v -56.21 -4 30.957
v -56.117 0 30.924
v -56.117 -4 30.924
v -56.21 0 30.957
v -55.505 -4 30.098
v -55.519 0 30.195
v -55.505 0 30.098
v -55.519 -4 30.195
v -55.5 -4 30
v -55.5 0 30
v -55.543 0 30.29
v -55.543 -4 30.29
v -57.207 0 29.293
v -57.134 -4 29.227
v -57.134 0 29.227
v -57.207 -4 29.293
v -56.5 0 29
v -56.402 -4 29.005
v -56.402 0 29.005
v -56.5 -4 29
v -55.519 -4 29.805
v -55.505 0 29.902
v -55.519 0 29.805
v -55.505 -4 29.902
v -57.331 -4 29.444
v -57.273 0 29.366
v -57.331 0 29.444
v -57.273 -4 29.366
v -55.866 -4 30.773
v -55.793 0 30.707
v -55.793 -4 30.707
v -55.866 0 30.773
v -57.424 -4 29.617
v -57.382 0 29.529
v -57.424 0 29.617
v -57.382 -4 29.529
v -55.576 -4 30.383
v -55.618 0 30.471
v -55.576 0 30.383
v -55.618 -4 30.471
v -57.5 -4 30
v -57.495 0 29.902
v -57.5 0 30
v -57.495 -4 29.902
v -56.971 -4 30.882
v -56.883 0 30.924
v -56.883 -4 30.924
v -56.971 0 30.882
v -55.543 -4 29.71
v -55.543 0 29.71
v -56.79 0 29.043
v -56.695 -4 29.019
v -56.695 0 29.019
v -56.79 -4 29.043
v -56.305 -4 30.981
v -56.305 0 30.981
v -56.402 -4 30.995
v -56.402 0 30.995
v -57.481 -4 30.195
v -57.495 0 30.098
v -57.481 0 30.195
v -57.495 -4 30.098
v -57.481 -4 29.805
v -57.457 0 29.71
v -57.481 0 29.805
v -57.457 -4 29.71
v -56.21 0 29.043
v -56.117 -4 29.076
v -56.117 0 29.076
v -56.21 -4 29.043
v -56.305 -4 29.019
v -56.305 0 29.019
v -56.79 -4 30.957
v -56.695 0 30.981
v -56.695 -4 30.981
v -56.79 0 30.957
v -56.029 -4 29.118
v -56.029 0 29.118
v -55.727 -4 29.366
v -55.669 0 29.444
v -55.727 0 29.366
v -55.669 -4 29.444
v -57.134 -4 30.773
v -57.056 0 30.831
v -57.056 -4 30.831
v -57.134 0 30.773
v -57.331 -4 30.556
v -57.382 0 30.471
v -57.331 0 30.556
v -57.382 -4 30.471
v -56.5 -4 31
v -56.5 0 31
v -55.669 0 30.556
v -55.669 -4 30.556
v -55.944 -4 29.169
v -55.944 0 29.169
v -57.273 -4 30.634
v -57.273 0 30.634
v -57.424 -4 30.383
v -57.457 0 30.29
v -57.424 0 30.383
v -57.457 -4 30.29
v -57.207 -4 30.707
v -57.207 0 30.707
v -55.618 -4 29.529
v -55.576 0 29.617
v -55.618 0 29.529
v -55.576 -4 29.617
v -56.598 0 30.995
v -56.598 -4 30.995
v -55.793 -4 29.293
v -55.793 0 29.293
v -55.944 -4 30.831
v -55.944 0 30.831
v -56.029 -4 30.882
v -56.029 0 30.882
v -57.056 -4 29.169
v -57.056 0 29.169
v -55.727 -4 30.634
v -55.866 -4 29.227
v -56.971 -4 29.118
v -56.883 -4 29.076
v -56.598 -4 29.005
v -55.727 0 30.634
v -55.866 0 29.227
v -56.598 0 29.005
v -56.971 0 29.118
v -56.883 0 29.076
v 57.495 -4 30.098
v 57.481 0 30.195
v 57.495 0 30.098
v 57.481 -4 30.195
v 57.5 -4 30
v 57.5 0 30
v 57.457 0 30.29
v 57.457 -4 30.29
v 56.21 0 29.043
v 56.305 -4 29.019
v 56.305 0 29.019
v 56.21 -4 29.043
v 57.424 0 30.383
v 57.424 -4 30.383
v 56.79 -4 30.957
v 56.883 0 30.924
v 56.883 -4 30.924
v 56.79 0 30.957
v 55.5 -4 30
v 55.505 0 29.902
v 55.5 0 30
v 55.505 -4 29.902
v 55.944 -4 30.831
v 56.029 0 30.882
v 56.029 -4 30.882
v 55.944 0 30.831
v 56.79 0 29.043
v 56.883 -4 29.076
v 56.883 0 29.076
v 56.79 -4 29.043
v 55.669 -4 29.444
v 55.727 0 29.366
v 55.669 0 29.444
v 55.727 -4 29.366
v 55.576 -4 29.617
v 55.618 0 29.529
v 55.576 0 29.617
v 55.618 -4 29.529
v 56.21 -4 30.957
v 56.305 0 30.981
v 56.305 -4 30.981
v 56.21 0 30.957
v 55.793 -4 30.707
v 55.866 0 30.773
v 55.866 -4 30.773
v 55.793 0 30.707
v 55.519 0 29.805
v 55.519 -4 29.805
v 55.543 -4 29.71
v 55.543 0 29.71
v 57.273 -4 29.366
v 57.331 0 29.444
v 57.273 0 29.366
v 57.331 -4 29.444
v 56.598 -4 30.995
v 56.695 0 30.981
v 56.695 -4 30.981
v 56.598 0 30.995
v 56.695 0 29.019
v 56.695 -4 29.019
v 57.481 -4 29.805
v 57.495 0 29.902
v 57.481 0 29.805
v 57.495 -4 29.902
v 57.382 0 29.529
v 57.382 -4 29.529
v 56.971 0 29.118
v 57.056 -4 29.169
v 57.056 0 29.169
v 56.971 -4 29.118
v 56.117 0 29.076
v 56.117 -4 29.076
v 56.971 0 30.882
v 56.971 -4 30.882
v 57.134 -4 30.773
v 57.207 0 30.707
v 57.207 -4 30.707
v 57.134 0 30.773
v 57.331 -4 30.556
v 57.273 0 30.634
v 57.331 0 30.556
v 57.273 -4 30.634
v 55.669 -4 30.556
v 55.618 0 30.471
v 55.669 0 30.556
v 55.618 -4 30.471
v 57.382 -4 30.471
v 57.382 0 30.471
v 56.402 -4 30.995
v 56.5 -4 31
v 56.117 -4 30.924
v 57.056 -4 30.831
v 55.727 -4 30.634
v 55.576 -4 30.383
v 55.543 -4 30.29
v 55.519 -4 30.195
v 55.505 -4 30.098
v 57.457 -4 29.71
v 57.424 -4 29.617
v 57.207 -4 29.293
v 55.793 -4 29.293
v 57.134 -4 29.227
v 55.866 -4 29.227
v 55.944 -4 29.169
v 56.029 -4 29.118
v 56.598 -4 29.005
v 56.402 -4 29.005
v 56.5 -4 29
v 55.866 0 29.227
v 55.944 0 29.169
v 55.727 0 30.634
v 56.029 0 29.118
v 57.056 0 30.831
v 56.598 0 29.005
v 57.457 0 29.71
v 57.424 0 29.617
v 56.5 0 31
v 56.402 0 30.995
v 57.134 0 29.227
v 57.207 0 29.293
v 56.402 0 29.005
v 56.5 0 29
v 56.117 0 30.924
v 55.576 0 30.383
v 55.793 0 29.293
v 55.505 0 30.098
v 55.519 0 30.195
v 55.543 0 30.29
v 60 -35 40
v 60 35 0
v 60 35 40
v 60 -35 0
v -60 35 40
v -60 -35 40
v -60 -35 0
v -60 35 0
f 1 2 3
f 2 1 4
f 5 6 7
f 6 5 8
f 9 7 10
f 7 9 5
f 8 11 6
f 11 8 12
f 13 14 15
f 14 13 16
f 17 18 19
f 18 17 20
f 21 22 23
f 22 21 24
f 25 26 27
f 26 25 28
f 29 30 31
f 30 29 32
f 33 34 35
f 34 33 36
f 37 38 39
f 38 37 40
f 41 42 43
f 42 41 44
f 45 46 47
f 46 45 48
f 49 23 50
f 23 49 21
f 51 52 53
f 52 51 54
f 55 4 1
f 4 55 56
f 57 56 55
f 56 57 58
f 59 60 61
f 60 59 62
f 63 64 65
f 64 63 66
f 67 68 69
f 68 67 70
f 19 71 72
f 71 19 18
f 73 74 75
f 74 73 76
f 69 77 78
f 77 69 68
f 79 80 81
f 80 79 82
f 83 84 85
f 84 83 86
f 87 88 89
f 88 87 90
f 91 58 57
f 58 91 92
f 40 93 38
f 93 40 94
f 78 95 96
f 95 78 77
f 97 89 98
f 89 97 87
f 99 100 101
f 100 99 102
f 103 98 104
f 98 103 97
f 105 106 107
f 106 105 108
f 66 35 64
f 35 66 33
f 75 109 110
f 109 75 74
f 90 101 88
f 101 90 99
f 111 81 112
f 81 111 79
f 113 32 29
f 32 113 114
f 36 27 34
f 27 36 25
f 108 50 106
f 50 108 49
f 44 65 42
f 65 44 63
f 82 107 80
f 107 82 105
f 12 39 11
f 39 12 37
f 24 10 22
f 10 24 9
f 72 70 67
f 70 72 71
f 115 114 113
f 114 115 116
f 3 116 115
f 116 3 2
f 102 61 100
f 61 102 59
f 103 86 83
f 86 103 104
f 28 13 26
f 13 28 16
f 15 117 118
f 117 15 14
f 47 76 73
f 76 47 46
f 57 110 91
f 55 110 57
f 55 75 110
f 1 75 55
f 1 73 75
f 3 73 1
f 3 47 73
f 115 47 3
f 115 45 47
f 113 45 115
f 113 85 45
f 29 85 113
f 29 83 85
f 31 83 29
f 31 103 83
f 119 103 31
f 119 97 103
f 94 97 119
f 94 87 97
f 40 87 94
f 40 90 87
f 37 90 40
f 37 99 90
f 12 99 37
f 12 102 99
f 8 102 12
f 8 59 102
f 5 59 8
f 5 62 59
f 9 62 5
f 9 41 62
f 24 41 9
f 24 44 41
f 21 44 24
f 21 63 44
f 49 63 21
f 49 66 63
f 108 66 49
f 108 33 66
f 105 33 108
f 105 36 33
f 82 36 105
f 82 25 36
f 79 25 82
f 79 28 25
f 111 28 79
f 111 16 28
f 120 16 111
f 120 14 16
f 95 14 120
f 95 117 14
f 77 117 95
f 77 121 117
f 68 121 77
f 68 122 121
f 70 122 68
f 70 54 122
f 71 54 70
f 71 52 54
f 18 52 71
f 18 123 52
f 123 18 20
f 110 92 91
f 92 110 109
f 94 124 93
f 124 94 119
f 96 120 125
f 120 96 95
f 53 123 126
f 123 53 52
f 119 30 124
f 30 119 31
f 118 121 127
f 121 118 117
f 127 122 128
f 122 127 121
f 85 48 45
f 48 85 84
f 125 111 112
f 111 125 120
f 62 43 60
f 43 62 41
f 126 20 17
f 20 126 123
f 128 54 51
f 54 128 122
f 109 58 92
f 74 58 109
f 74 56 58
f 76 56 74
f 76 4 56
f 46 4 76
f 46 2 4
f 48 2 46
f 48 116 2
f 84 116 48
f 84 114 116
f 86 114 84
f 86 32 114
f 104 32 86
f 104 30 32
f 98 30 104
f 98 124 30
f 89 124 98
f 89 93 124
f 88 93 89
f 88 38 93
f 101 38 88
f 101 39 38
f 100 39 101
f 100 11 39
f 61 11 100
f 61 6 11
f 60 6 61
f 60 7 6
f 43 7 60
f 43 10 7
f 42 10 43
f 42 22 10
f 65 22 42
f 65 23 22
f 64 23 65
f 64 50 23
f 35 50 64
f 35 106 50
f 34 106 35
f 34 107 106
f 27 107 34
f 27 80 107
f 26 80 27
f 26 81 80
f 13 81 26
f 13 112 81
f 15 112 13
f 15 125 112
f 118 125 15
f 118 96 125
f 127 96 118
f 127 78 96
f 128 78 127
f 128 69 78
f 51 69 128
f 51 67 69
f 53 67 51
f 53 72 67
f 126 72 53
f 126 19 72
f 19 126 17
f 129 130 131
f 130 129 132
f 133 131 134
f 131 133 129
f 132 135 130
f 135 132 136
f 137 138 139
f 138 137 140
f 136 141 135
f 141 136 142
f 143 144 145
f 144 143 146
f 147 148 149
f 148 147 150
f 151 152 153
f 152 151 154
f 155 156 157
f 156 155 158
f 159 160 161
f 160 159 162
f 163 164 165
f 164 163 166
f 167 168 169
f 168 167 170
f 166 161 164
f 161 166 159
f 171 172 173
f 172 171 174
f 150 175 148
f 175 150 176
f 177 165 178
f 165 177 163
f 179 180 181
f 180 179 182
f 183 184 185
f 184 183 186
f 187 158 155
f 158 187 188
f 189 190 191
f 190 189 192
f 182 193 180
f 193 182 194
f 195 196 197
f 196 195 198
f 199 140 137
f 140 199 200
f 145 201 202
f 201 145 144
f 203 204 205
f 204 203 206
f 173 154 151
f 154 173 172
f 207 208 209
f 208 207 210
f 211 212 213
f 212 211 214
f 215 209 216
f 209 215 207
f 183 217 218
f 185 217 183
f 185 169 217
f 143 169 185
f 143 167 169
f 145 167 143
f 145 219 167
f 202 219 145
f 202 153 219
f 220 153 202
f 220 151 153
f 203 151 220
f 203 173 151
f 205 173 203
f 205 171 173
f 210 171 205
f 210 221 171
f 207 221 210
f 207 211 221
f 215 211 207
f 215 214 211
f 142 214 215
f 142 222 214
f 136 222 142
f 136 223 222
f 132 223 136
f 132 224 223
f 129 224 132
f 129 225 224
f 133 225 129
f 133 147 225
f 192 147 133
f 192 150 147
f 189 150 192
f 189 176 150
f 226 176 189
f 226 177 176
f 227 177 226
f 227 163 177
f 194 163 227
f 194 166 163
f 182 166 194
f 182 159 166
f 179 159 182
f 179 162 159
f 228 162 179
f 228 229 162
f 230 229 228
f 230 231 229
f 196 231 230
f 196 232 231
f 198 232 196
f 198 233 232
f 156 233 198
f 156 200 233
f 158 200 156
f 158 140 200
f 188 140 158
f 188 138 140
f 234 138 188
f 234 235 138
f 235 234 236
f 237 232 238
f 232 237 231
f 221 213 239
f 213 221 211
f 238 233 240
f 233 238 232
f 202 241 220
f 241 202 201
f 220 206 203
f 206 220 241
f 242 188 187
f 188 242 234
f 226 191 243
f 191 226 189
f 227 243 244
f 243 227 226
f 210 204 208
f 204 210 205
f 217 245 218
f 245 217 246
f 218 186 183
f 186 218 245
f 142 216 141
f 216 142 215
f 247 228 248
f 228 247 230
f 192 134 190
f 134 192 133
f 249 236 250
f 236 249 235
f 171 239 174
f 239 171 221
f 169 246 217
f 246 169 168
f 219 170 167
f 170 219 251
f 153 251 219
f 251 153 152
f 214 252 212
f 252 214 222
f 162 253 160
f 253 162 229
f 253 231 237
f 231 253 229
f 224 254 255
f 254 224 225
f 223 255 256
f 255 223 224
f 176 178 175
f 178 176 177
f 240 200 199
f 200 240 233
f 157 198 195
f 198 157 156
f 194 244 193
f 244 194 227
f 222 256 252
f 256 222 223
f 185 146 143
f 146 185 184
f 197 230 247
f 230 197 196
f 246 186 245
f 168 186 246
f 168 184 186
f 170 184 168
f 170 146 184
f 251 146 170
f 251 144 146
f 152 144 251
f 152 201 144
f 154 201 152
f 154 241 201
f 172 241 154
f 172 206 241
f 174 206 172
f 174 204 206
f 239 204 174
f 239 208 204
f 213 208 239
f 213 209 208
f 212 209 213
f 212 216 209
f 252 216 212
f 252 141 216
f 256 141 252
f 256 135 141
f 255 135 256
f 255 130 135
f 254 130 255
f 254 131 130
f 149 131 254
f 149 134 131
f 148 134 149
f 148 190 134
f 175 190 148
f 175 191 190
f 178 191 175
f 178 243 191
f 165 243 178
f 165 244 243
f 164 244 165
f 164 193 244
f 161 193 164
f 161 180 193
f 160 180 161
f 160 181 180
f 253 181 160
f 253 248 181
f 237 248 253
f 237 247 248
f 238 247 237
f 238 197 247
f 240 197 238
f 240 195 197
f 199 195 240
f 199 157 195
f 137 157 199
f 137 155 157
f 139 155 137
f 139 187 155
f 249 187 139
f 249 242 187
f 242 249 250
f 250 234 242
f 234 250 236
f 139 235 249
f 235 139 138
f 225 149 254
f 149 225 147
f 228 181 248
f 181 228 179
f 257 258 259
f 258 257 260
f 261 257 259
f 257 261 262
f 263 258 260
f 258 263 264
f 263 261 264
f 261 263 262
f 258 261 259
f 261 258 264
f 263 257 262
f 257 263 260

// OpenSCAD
// Mini horizontal gel-electrophoresis box - buffer tank
// Print orientation: tank resting on XY plane, building up +Z

$fn = 64;

// ---- Tank dimensions ----
outer_x = 120;   // outer length in X
outer_y = 70;    // outer width in Y
outer_z = 40;    // outer height in Z
wall    = 3;     // wall thickness
floor   = 3;     // floor thickness

// ---- Platform dimensions ----
plat_x     = 60;   // platform length in X (centred)
plat_y     = outer_y; // platform spans full inner width
plat_top_z = 13;   // platform top height (10 mm above inner floor)

// ---- Electrode holes ----
hole_d     = 2;    // hole diameter
hole_y     = 0;    // hole Y position
hole_z     = 30;   // hole Z position

// ---- Derived ----
inner_x = outer_x - 2 * wall;
inner_z = outer_z - wall;
eps     = 0.5;     // cutter overshoot

difference() {
    union() {
        // Tank body
        translate([-outer_x / 2, -outer_y / 2, 0])
            cube([outer_x, outer_y, outer_z]);

        // Raised platform
        translate([-plat_x / 2, -plat_y / 2, outer_z - floor])
            cube([plat_x, plat_y, plat_top_z - (outer_z - floor)]);
    }

    // Electrode holes through end walls
    for (sx = [-1, 1])
        translate([sx * (inner_x / 2 - eps), hole_y, hole_z])
            rotate([90, 0, 0])
                cylinder(d = hole_d, h = wall + 2 * eps);
}
